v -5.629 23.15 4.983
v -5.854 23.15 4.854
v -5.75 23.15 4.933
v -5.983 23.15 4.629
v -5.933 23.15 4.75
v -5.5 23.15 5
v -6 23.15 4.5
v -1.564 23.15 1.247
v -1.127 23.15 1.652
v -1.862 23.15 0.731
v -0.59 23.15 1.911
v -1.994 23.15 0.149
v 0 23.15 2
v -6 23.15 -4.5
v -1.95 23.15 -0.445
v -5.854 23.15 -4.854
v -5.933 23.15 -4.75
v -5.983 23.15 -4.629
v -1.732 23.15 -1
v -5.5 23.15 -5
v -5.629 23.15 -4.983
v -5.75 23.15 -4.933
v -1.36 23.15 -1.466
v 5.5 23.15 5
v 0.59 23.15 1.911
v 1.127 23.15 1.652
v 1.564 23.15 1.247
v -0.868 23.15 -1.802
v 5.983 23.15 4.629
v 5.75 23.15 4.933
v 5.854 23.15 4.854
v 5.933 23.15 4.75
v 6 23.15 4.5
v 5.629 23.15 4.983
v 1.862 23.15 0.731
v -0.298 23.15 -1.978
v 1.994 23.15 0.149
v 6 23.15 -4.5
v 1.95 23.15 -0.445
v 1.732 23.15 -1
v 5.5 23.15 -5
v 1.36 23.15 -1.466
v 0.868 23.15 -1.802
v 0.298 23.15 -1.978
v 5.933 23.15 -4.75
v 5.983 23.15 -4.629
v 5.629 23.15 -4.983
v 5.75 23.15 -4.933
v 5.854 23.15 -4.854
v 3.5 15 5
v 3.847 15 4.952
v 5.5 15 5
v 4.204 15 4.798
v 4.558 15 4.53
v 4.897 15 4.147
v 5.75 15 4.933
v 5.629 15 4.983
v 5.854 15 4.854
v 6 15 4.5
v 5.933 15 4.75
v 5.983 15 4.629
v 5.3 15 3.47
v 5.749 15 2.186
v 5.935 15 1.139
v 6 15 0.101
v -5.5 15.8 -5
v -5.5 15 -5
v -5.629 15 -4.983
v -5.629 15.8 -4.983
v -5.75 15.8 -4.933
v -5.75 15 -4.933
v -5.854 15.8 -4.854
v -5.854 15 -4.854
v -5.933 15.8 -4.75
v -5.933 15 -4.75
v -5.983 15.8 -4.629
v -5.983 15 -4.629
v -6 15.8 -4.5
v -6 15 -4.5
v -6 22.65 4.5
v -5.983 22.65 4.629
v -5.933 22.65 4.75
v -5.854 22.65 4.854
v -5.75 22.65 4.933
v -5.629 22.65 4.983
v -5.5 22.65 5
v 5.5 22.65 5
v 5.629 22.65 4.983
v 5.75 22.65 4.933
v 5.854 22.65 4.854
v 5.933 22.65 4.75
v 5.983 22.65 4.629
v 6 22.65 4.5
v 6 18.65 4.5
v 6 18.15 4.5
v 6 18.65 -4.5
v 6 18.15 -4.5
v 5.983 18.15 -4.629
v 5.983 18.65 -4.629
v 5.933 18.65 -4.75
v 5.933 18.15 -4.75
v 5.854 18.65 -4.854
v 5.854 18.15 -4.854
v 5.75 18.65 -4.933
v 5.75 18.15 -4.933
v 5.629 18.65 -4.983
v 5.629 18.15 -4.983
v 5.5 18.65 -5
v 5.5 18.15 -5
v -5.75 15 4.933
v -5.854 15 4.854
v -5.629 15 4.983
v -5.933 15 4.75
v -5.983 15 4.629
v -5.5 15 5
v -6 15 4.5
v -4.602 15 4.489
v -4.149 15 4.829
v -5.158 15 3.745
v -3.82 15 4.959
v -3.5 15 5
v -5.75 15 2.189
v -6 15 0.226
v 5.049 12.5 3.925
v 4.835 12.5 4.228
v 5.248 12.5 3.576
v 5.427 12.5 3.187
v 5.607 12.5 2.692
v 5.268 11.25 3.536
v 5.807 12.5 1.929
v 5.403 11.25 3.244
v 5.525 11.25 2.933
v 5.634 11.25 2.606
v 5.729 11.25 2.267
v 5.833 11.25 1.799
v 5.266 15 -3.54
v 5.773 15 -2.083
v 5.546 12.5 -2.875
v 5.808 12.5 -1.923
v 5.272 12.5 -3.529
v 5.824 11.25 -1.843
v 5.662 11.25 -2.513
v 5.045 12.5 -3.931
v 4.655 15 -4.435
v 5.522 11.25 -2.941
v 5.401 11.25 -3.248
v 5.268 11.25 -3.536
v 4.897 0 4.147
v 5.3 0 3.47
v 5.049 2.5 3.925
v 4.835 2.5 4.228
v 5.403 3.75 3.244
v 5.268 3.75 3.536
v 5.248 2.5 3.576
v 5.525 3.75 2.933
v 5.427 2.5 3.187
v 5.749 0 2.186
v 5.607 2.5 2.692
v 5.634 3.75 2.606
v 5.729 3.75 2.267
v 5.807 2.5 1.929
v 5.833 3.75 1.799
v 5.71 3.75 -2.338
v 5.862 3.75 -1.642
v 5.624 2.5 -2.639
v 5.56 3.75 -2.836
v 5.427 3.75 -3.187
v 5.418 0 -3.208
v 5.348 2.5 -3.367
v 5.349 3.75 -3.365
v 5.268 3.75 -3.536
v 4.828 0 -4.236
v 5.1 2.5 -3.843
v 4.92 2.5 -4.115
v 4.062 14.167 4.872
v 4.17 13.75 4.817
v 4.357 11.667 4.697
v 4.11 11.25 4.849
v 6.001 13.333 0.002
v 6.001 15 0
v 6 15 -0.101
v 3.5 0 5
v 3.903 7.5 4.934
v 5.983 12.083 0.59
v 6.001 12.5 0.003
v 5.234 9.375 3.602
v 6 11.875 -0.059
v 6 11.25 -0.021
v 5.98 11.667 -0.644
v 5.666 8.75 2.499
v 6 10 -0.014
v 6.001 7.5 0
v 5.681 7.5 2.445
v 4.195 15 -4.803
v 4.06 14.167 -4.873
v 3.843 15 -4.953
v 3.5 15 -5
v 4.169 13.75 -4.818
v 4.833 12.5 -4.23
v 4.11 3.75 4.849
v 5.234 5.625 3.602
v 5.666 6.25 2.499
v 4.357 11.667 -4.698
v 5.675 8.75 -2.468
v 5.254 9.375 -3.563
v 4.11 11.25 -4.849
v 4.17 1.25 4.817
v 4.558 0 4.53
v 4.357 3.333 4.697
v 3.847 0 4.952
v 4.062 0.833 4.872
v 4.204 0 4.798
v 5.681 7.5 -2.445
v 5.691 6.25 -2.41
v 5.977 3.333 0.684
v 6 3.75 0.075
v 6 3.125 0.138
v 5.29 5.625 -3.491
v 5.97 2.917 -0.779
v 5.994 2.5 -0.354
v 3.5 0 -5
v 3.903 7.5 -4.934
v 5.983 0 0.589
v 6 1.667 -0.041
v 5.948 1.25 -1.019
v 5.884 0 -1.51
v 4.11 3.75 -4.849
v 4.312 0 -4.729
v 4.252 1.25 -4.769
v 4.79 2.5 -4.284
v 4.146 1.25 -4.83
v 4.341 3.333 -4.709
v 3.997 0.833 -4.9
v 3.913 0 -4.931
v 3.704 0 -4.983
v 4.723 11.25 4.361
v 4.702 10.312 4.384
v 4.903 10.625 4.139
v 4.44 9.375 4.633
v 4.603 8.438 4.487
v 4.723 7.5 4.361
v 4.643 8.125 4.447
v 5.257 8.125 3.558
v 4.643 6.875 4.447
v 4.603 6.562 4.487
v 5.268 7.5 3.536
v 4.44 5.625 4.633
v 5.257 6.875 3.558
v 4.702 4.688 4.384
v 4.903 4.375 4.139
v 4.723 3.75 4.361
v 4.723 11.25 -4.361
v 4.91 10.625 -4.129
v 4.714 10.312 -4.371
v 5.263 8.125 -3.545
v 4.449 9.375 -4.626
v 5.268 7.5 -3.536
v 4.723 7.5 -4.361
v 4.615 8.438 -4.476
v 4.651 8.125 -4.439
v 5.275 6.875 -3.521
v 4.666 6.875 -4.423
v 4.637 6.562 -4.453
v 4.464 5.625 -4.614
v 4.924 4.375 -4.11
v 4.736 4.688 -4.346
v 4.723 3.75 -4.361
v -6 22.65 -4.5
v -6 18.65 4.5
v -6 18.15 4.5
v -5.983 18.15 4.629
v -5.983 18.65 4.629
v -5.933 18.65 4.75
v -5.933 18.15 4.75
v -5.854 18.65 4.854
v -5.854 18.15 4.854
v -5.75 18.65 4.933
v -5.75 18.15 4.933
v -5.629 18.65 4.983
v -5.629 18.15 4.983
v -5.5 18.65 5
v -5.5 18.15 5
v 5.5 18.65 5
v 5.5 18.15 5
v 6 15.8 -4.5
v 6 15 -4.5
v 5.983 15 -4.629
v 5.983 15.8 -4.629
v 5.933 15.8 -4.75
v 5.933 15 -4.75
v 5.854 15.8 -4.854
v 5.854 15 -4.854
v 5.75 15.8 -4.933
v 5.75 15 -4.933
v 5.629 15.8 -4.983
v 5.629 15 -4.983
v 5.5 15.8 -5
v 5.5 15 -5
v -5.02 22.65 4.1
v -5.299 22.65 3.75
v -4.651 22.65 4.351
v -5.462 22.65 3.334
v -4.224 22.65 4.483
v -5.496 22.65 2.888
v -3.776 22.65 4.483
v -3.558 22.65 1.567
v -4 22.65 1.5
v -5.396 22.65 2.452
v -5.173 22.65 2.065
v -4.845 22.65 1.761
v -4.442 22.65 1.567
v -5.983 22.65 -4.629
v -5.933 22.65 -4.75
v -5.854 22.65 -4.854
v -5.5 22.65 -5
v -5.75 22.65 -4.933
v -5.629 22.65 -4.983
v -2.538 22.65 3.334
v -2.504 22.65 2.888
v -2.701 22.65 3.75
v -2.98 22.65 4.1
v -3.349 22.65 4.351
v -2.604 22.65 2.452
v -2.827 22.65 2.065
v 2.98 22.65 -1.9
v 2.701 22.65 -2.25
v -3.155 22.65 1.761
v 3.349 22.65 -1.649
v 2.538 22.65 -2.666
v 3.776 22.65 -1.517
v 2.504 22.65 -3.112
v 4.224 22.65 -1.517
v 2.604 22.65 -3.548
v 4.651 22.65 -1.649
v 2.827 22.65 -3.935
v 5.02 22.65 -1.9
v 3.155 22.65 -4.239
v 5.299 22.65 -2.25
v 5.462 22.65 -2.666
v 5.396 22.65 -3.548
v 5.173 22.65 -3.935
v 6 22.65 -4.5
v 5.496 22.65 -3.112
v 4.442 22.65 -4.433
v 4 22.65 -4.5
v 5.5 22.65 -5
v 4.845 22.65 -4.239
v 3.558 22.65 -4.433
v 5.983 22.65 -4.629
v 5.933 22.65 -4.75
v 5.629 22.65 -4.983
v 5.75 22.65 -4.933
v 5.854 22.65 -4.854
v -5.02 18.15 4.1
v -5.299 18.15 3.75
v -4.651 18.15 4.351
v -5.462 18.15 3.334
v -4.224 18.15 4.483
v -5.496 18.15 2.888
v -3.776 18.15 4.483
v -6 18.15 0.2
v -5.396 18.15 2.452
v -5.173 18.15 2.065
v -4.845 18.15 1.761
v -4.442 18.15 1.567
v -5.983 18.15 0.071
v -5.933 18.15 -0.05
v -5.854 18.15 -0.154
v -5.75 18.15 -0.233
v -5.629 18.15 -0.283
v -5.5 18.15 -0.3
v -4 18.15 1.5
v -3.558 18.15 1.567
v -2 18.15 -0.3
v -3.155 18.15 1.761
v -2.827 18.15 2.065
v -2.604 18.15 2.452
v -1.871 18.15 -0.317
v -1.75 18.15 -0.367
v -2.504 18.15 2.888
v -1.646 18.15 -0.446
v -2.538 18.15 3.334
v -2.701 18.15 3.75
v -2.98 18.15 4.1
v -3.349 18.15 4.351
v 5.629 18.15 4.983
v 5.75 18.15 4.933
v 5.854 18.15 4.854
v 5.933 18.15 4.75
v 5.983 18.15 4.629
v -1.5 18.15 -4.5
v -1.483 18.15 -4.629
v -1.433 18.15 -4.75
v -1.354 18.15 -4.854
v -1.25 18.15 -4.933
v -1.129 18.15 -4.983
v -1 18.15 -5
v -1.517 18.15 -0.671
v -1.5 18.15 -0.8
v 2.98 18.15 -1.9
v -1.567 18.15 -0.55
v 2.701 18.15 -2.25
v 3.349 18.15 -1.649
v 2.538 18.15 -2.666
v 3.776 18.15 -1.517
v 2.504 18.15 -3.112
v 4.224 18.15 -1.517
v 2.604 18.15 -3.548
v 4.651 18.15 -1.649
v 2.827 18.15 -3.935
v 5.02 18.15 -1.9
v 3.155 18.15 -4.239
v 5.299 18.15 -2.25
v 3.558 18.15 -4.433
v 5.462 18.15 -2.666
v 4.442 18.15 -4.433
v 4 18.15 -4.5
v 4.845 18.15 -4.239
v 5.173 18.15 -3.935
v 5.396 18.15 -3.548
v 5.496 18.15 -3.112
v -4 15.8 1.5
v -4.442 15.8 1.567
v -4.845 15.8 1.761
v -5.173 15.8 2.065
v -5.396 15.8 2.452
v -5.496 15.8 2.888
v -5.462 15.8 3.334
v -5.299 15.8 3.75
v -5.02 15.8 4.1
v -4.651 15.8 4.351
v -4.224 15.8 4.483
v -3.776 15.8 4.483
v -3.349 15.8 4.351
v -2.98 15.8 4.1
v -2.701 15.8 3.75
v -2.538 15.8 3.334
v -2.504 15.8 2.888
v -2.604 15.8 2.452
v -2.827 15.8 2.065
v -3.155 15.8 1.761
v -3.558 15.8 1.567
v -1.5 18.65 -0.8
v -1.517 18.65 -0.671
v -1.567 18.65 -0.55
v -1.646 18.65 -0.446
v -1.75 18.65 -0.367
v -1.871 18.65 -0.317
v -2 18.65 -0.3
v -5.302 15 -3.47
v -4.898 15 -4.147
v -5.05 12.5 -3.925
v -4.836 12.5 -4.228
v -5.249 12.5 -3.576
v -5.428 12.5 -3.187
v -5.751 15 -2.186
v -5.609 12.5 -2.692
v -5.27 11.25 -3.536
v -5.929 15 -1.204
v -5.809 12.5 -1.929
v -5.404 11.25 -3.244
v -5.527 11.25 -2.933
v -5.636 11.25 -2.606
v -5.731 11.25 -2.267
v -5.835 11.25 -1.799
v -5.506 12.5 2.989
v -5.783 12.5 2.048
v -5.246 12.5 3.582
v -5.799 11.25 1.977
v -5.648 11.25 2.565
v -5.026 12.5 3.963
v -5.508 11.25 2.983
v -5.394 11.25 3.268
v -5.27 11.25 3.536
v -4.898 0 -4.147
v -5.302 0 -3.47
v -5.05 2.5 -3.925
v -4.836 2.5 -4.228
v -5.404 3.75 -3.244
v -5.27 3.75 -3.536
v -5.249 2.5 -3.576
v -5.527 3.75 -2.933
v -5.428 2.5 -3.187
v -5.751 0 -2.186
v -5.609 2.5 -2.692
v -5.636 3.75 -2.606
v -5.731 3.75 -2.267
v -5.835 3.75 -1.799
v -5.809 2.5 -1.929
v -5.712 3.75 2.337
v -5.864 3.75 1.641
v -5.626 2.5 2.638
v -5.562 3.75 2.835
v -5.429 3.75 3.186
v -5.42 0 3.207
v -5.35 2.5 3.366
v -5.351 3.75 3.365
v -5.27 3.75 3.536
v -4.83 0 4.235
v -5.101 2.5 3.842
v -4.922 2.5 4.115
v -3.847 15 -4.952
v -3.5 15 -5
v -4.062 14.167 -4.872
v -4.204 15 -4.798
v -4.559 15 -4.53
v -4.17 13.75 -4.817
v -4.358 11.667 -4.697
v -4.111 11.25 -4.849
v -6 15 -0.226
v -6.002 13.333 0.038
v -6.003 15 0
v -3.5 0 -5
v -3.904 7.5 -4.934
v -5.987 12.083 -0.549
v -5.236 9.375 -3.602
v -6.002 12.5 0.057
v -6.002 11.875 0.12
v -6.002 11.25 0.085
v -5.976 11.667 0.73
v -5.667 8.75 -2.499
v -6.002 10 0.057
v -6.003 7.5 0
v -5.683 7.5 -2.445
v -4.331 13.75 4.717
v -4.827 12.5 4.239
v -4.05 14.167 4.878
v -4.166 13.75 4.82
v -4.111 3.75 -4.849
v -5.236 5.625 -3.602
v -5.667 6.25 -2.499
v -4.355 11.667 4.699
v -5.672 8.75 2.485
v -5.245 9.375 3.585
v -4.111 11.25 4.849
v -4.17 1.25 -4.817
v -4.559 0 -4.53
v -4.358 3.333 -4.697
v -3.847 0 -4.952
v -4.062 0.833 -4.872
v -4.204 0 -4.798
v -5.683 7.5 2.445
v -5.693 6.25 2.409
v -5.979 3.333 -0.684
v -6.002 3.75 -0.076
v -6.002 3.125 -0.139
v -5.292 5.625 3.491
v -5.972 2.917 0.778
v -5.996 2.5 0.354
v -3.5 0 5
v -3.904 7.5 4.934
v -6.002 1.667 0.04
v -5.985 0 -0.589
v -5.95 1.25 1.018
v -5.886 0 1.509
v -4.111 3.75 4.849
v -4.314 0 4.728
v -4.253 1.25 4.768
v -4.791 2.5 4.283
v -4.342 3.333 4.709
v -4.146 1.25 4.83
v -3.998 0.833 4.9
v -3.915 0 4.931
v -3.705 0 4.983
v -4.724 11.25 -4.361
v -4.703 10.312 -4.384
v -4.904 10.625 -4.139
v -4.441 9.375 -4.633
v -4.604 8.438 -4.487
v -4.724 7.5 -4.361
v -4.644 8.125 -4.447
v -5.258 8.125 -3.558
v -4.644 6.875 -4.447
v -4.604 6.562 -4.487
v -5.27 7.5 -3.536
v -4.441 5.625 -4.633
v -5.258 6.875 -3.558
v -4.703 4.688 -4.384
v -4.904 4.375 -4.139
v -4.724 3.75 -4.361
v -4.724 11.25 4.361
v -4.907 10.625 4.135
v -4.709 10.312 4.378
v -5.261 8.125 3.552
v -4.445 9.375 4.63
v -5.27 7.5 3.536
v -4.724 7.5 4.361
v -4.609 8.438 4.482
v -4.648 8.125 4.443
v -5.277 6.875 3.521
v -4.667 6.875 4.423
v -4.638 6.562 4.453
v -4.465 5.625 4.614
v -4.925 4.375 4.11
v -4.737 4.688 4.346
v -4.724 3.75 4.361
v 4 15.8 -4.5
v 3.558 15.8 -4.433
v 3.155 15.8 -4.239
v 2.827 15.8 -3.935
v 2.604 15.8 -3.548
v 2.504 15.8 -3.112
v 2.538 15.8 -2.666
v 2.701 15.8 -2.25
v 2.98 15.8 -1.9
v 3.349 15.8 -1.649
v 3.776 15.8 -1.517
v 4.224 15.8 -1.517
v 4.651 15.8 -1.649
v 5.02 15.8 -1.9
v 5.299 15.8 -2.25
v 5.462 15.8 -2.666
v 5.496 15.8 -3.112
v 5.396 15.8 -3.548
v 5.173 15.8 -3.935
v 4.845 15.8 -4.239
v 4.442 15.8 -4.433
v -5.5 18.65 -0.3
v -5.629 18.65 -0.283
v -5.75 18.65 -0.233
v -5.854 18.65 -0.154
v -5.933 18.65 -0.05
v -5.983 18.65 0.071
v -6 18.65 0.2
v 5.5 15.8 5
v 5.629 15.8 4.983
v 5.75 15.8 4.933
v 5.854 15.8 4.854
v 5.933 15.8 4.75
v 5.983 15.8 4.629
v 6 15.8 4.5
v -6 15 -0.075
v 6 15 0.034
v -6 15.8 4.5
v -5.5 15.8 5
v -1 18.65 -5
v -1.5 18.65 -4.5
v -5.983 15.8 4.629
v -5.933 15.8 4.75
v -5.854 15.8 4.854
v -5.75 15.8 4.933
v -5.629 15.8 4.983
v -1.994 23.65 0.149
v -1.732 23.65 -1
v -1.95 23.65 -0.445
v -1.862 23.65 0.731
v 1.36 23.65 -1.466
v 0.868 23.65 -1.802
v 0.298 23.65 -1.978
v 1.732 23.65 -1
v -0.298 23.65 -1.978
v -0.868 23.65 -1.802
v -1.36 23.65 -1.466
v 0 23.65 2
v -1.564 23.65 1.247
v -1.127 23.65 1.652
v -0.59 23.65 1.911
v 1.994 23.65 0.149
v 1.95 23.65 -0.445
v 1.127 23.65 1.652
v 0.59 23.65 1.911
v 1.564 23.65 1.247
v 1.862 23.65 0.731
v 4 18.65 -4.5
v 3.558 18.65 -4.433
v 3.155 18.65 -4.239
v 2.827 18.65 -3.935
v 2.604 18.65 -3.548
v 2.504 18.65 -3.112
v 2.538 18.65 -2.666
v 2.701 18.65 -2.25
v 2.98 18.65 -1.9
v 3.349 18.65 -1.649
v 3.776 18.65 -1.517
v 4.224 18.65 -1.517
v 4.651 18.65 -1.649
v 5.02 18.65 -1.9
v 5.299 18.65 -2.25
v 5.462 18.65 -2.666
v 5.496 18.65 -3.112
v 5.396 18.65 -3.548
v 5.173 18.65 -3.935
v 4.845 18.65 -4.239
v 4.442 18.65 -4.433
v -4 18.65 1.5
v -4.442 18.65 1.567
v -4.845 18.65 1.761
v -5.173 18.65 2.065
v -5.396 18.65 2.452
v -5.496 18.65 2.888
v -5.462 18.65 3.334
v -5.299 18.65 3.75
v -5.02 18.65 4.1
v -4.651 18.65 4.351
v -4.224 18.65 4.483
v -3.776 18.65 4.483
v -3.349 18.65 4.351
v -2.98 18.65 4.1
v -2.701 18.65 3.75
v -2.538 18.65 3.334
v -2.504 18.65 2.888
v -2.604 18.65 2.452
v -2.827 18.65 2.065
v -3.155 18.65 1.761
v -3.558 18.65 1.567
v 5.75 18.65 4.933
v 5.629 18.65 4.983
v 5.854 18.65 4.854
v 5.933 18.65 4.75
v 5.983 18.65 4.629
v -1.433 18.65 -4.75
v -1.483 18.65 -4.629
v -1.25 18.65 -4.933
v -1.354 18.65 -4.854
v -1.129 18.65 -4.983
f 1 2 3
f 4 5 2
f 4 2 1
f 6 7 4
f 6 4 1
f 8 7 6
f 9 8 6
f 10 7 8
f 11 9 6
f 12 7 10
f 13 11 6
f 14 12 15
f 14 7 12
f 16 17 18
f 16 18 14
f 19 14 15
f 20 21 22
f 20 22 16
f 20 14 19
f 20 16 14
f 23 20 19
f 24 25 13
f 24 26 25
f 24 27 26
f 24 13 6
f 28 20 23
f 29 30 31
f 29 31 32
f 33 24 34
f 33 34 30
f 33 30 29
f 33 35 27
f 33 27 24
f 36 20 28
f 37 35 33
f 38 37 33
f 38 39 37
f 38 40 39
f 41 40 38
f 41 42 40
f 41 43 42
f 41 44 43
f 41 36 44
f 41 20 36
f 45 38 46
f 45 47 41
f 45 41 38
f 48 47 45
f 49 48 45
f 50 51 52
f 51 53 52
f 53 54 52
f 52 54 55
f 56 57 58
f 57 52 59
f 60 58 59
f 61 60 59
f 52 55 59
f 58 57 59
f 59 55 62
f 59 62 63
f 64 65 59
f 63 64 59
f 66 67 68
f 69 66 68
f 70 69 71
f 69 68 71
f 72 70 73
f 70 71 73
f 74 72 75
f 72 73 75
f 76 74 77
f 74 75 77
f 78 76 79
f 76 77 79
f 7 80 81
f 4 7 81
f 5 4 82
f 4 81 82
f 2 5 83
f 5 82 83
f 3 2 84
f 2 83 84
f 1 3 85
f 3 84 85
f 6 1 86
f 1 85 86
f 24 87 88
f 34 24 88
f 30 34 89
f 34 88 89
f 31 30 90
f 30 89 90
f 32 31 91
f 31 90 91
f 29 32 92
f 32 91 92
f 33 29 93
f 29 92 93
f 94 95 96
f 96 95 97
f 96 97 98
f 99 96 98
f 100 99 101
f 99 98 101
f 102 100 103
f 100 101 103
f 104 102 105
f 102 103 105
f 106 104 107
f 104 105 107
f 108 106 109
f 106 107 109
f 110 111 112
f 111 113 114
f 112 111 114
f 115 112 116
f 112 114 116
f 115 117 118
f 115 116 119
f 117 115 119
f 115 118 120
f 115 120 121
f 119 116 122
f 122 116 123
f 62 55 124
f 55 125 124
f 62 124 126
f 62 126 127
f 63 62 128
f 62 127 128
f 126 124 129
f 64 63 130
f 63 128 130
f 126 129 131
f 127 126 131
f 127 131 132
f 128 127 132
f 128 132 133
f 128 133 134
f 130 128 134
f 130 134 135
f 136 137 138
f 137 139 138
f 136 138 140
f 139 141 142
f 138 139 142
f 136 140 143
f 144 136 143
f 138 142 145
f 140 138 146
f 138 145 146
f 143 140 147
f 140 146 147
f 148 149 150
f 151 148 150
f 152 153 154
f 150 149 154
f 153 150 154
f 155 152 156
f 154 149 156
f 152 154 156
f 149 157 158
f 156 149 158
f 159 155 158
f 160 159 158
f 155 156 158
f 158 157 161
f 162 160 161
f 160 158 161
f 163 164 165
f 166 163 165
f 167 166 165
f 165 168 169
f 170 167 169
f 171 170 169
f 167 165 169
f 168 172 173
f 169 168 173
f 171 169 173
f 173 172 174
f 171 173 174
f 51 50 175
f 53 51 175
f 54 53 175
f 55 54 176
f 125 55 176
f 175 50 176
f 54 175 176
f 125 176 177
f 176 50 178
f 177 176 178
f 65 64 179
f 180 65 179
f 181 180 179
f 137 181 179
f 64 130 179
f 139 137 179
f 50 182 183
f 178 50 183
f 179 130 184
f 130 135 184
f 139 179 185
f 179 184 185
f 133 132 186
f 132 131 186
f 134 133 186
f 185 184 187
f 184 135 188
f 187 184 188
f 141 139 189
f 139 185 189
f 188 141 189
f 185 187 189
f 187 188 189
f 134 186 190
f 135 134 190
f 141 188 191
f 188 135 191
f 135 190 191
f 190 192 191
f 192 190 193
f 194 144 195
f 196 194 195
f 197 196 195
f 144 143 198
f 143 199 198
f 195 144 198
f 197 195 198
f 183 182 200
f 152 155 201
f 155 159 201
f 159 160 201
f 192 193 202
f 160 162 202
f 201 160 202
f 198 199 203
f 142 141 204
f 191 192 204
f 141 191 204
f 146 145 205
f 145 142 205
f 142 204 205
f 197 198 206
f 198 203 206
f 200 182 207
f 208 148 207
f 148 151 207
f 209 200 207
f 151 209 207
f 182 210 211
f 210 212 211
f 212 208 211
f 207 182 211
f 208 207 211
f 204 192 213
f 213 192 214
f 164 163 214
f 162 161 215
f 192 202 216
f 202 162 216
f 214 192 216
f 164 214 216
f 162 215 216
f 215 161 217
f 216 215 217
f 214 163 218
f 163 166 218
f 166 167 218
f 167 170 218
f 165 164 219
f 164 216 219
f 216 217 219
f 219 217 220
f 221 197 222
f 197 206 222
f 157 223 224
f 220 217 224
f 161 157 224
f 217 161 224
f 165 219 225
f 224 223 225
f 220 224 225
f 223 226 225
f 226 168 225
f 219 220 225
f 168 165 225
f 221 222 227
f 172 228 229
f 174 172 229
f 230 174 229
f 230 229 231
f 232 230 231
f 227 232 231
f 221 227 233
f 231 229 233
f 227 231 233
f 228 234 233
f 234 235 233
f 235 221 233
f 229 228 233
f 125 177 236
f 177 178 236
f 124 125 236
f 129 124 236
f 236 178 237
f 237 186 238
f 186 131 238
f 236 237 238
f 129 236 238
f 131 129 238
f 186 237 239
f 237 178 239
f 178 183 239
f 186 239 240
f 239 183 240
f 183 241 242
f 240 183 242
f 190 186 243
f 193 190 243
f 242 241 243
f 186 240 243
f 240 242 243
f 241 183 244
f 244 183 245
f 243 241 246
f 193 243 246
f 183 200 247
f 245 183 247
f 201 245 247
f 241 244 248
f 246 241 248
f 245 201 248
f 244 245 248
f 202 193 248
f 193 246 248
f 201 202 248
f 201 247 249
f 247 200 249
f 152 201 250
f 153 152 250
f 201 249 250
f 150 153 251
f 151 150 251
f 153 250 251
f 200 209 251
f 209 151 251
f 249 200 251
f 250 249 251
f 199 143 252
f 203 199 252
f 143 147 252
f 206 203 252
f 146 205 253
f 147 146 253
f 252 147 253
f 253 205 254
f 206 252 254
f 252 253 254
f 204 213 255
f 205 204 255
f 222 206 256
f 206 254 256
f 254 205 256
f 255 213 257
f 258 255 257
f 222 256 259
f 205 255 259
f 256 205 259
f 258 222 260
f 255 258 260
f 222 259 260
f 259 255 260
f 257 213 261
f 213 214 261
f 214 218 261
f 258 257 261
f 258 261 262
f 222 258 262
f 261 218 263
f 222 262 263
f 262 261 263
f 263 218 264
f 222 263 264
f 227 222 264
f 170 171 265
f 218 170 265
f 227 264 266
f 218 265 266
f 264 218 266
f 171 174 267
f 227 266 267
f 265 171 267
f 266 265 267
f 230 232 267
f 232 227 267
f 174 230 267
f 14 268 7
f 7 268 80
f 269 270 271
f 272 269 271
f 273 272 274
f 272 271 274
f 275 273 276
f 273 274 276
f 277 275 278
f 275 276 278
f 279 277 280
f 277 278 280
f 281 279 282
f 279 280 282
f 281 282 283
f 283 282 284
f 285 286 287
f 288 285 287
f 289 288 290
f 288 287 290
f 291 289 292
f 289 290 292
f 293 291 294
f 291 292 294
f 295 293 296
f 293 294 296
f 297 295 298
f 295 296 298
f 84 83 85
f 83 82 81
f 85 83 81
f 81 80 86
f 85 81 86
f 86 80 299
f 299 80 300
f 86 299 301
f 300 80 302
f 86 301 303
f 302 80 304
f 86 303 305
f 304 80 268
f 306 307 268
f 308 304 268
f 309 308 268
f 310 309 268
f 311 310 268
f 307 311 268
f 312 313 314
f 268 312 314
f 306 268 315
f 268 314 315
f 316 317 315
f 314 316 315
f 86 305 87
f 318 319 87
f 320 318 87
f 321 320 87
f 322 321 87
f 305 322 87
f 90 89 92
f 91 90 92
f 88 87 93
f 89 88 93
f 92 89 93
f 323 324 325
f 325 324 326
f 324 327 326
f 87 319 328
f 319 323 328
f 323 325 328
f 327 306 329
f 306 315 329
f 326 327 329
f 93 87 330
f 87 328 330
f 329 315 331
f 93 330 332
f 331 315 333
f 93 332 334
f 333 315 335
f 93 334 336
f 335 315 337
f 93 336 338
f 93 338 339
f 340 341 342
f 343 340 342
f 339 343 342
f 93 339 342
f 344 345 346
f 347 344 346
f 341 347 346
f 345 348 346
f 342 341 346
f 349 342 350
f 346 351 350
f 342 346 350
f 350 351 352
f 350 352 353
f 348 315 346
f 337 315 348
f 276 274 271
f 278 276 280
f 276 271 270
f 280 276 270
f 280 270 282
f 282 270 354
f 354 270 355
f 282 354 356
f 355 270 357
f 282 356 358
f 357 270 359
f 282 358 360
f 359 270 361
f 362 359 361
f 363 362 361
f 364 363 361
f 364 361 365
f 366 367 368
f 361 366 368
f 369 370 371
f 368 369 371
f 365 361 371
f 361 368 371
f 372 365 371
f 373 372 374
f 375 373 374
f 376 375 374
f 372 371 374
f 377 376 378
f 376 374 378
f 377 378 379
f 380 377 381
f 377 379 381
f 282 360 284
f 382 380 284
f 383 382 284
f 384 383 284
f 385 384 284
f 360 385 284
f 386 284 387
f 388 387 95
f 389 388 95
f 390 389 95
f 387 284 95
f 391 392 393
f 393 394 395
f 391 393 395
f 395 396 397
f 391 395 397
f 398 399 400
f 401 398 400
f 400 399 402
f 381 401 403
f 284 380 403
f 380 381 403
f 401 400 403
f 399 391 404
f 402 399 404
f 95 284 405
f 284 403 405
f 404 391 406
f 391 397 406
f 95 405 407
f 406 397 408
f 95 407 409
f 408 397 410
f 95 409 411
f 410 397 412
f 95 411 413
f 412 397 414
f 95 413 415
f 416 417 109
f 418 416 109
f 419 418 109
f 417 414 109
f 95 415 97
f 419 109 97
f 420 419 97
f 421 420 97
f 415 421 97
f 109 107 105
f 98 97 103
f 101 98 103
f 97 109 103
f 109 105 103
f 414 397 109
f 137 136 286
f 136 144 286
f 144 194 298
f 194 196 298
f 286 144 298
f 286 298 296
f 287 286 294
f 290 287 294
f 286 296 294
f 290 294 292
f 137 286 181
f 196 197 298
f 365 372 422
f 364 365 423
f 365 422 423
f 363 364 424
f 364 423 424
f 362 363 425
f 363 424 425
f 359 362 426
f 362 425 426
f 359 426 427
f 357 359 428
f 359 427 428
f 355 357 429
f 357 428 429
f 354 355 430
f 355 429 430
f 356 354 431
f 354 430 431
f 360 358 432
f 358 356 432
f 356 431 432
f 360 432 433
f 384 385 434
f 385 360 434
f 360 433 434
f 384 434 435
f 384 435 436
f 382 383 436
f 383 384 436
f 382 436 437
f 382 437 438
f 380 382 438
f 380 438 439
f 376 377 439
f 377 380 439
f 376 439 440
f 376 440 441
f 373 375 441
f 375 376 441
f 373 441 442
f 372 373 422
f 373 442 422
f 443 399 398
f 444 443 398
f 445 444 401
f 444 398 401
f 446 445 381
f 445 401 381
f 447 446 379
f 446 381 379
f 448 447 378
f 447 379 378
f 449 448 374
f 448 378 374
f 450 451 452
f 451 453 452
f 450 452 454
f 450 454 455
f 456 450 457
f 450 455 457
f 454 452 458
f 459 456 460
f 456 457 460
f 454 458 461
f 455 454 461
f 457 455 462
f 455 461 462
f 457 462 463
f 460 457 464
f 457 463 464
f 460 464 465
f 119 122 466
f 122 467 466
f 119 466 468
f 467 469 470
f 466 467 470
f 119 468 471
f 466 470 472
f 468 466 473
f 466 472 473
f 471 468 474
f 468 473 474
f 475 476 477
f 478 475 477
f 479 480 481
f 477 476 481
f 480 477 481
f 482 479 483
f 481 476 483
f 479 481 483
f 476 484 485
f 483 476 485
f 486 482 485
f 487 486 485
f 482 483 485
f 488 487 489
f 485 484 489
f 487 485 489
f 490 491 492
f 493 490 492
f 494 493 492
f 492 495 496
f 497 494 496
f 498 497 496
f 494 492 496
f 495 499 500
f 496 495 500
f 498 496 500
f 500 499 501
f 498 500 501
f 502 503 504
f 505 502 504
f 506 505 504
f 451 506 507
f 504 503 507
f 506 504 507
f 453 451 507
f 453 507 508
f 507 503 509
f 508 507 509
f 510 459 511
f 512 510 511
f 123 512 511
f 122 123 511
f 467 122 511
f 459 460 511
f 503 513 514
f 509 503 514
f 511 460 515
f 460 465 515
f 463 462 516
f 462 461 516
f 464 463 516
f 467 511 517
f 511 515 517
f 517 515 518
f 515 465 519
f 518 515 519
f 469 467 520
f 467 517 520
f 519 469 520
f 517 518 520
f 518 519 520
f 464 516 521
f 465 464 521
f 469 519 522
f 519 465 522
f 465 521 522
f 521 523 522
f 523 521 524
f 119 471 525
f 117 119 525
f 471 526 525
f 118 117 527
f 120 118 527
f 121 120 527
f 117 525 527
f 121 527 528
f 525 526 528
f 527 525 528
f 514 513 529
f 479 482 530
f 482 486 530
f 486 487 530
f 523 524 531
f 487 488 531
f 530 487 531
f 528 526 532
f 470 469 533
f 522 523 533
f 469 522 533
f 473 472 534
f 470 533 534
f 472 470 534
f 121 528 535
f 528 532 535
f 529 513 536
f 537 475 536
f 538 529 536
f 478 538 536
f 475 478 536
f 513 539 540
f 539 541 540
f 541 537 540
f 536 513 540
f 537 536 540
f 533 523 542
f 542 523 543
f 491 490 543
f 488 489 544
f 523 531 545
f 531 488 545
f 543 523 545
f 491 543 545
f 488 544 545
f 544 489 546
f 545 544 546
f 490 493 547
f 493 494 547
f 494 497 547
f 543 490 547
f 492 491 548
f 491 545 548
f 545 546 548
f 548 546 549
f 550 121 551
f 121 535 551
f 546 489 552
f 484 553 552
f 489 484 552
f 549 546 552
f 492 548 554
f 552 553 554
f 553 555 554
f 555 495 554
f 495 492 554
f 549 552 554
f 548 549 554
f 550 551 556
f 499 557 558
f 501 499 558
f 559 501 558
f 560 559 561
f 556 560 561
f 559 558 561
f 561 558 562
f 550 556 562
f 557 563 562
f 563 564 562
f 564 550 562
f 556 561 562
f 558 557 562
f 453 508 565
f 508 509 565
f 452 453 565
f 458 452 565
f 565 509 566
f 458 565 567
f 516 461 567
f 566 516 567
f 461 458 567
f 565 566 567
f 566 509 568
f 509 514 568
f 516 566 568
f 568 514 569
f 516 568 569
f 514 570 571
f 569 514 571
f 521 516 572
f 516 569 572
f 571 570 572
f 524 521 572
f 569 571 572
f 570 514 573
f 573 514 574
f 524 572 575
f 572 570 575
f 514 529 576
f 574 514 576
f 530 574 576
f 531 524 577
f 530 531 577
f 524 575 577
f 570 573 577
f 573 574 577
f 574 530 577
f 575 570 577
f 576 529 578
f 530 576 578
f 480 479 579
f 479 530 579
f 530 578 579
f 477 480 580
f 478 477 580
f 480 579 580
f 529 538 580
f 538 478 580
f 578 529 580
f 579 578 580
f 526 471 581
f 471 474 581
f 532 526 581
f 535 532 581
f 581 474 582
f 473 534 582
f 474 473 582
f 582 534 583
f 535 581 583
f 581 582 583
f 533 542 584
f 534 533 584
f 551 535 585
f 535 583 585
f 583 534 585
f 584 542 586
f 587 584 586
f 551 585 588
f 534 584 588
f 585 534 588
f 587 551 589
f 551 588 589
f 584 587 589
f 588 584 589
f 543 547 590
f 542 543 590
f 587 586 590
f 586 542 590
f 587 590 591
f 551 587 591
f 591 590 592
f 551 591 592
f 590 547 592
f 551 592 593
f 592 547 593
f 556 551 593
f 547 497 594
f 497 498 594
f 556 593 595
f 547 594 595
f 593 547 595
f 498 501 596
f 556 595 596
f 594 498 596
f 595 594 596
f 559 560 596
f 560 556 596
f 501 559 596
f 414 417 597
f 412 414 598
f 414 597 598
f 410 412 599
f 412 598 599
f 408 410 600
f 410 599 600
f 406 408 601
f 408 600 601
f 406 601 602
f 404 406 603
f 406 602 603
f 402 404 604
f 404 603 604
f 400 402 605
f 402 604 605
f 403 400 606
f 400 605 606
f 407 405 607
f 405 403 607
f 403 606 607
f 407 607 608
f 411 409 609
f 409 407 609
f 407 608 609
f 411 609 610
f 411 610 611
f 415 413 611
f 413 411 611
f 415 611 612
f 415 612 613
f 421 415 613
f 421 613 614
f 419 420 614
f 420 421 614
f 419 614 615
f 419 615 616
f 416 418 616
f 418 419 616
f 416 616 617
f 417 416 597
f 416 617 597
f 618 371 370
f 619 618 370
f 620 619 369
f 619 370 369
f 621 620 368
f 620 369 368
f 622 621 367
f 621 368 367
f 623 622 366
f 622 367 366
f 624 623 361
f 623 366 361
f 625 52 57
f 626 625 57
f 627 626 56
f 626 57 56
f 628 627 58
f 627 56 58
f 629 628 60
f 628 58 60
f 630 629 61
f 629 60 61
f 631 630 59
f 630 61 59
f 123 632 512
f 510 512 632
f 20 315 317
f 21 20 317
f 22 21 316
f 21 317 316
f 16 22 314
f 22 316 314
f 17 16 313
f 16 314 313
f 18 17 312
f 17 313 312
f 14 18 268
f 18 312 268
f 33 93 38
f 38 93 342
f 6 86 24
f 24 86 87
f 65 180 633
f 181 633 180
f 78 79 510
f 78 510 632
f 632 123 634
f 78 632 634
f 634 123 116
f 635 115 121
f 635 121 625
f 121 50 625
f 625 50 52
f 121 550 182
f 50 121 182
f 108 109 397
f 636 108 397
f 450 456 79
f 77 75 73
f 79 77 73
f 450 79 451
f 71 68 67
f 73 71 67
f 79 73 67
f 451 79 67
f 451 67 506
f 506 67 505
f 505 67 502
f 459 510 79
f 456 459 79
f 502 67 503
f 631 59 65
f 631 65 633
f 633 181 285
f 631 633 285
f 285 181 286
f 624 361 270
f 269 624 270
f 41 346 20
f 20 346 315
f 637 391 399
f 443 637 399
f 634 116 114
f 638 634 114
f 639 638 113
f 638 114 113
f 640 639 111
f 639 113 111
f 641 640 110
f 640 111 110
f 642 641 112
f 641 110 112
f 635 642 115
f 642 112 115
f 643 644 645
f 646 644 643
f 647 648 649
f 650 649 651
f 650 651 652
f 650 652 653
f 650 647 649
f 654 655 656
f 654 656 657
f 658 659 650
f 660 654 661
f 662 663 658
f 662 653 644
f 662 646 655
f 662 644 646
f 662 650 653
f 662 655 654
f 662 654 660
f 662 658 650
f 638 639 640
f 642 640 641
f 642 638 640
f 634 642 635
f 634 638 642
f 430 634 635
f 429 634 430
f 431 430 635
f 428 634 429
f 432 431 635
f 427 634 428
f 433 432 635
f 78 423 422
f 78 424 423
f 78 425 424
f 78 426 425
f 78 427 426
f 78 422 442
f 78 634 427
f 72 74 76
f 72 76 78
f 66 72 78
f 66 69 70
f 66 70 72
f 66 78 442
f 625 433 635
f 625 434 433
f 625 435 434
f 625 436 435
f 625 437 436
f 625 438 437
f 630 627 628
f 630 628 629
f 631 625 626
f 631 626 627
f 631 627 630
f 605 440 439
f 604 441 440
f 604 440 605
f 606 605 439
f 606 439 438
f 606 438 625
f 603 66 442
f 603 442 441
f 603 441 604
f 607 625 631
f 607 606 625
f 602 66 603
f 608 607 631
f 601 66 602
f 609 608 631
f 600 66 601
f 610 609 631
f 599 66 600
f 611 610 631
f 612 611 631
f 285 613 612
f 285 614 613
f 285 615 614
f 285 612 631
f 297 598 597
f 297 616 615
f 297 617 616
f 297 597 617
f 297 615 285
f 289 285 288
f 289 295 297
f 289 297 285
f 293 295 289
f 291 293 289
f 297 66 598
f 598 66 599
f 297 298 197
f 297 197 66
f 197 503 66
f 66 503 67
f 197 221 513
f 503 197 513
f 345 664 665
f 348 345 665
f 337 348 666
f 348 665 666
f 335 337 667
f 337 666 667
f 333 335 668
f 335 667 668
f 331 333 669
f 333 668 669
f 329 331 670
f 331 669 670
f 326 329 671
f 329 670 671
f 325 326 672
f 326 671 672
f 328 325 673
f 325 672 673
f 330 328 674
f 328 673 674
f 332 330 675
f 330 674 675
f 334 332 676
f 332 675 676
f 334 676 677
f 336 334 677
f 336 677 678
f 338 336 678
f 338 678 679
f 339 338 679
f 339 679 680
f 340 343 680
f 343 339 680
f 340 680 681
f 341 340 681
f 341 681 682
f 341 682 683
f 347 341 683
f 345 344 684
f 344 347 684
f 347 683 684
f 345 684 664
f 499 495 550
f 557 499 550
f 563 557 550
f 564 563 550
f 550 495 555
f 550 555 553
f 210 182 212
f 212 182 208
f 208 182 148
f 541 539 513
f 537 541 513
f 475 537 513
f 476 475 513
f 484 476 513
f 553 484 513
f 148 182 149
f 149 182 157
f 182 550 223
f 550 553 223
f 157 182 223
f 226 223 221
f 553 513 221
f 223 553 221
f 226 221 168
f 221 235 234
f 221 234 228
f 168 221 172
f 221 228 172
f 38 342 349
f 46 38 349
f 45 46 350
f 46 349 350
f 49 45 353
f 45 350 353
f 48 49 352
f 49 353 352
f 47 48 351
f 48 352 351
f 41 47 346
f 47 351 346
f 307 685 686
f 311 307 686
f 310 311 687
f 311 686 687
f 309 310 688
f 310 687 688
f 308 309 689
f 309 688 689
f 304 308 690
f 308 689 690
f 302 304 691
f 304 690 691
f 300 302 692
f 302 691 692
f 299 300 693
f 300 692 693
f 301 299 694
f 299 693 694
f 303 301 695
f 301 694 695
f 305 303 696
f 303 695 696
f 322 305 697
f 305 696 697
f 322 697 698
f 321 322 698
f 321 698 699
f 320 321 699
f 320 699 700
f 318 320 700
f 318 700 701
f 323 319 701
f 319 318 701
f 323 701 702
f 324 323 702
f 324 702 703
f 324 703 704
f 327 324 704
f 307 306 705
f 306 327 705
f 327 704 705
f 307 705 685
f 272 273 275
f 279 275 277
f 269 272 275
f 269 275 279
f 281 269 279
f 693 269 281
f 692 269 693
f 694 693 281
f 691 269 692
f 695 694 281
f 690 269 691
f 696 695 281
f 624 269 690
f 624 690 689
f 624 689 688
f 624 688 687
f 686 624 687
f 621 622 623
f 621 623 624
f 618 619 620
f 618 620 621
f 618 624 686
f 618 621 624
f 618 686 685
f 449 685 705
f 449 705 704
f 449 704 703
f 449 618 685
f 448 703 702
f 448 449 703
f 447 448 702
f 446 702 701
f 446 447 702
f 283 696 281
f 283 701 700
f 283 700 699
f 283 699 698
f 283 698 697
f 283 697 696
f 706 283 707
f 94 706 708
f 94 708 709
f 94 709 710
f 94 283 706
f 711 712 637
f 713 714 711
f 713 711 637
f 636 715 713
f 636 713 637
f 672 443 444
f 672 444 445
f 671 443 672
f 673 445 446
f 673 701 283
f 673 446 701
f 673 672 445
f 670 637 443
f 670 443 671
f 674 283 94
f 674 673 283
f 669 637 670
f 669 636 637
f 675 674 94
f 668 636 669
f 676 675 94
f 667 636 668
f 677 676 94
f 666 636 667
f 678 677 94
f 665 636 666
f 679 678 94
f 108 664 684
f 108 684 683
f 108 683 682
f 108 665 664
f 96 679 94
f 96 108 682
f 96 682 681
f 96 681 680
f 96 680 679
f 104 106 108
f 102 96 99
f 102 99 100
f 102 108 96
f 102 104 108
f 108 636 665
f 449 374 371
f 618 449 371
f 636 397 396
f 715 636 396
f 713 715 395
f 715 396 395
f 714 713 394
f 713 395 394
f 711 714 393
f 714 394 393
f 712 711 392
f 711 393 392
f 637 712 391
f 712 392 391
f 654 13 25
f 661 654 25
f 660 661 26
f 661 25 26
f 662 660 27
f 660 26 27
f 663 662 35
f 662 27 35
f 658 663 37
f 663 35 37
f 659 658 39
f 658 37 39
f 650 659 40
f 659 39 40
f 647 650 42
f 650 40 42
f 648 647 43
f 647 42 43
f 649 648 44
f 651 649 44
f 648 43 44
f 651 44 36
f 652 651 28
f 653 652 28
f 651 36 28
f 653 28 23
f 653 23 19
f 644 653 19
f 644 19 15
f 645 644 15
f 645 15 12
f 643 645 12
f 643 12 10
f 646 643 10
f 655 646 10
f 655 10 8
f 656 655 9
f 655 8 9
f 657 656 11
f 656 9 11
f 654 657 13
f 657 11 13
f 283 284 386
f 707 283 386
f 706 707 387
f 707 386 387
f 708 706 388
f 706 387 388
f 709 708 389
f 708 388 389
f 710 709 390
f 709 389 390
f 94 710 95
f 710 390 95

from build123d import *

# Parameters (mm, degrees)
SKETCH1_W           = 7
SKETCH1_H           = 10
BOSS_EXTRUDE1_DEPTH = 15
BOSS_EXTRUDE2_DEPTH = 0.8
SKETCH3_R           = 1.5
BOSS_EXTRUDE3_DEPTH = 7.35
BOSS_EXTRUDE4_DEPTH = 0.5
BOSS_EXTRUDE5_DEPTH = 0.5
SKETCH7_R           = 2
BOSS_EXTRUDE6_DEPTH = 0.5


with BuildPart() as part:
    # Sketch1 → Boss-Extrude1 (new body)
    with BuildSketch(Plane(origin=(0, 0, 0), x_dir=(1, 0, 0), z_dir=(0, 1, 0))):
        with BuildLine():
            Line((-3.5, -5), (-3.5, 5))
            add(Edge.make_bspline(
                [(-3.5, 5), (-6.002556946, 5), (-6.002556946, 0), (-6.002556946, -5), (-3.5, -5)],
                knots=[0, 0, 0, 1.570796327, 1.570796327, 3.141592654, 3.141592654, 3.141592654], degree=2, weights=[1, 0.707106781, 1, 0.707106781, 1]))
        make_face()
        Rectangle(SKETCH1_W, SKETCH1_H)
        with BuildLine():
            Line((3.5, -5), (3.5, 5))
            add(Edge.make_bspline(
                [(3.5, -5), (6.000509097, -5), (6.000509097, 0), (6.000509097, 5), (3.5, 5)],
                knots=[3.141592654, 3.141592654, 3.141592654, 4.71238898, 4.71238898, 6.283185307, 6.283185307, 6.283185307], degree=2, weights=[1, 0.707106781, 1, 0.707106781, 1]))
        make_face()
    extrude(amount=BOSS_EXTRUDE1_DEPTH)

    # Sketch2 → Boss-Extrude2 (add)
    with BuildSketch(Plane(origin=(0, 15, 0), x_dir=(1, 0, 0), z_dir=(0, 1, 0))):
        with BuildLine():
            Line((-5.5, -5), (5.5, -5))
            ThreePointArc((5.5, -5), (5.853553391, -4.853553391), (6, -4.5))
            Line((6, -4.5), (6, 4.5))
            ThreePointArc((6, 4.5), (5.853553391, 4.853553391), (5.5, 5))
            Line((5.5, 5), (-5.5, 5))
            ThreePointArc((-5.5, 5), (-5.853553391, 4.853553391), (-6, 4.5))
            Line((-6, 4.5), (-6, -4.5))
            ThreePointArc((-6, -4.5), (-5.853553391, -4.853553391), (-5.5, -5))
        make_face()
    extrude(amount=BOSS_EXTRUDE2_DEPTH)

    # Sketch3 → Boss-Extrude3 (add)
    with BuildSketch(Plane(origin=(0, 15.8, 0), x_dir=(1, 0, 0), z_dir=(0, 1, 0))):
        with Locations(Location((4, 3, 0), (0, 0, 90))):
            Circle(SKETCH3_R)
        with Locations(Location((-4, -3, 0), (0, 0, 90))):
            Circle(SKETCH3_R)
    extrude(amount=BOSS_EXTRUDE3_DEPTH)

    # Sketch4 → Boss-Extrude4 (add)
    with BuildSketch(Plane(origin=(0, 18.15, 0), x_dir=(1, 0, 0), z_dir=(0, 1, 0))):
        with BuildLine():
            Line((-1.5, 4.5), (-1.5, 0.8))
            ThreePointArc((-1.5, 0.8), (-1.646446609, 0.446446609), (-2, 0.3))
            Line((-2, 0.3), (-5.5, 0.3))
            ThreePointArc((-5.5, 0.3), (-5.853553391, 0.153553391), (-6, -0.2))
            Line((-6, -0.2), (-6, -4.5))
            ThreePointArc((-6, -4.5), (-5.853553391, -4.853553391), (-5.5, -5))
            Line((-5.5, -5), (5.5, -5))
            ThreePointArc((5.5, -5), (5.853553391, -4.853553391), (6, -4.5))
            Line((6, -4.5), (6, 4.5))
            ThreePointArc((6, 4.5), (5.853553391, 4.853553391), (5.5, 5))
            Line((5.5, 5), (-1, 5))
            ThreePointArc((-1, 5), (-1.353553391, 4.853553391), (-1.5, 4.5))
        make_face()
    extrude(amount=BOSS_EXTRUDE4_DEPTH)

    # Sketch6 → Boss-Extrude5 (add)
    with BuildSketch(Plane(origin=(0, 22.65, 0), x_dir=(1, 0, 0), z_dir=(0, 1, 0))):
        with BuildLine():
            Line((-5.5, -5), (5.5, -5))
            ThreePointArc((5.5, -5), (5.853553391, -4.853553391), (6, -4.5))
            Line((6, -4.5), (6, 4.5))
            ThreePointArc((6, 4.5), (5.853553391, 4.853553391), (5.5, 5))
            Line((5.5, 5), (-5.5, 5))
            ThreePointArc((-5.5, 5), (-5.853553391, 4.853553391), (-6, 4.5))
            Line((-6, 4.5), (-6, -4.5))
            ThreePointArc((-6, -4.5), (-5.853553391, -4.853553391), (-5.5, -5))
        make_face()
    extrude(amount=BOSS_EXTRUDE5_DEPTH)

    # Sketch7 → Boss-Extrude6 (add)
    with BuildSketch(Plane(origin=(0, 23.15, 0), x_dir=(1, 0, 0), z_dir=(0, 1, 0))):
        with Locations(Location((0, 0, 0), (0, 0, 270))):
            Circle(SKETCH7_R)
    extrude(amount=BOSS_EXTRUDE6_DEPTH)


solid = part.part
